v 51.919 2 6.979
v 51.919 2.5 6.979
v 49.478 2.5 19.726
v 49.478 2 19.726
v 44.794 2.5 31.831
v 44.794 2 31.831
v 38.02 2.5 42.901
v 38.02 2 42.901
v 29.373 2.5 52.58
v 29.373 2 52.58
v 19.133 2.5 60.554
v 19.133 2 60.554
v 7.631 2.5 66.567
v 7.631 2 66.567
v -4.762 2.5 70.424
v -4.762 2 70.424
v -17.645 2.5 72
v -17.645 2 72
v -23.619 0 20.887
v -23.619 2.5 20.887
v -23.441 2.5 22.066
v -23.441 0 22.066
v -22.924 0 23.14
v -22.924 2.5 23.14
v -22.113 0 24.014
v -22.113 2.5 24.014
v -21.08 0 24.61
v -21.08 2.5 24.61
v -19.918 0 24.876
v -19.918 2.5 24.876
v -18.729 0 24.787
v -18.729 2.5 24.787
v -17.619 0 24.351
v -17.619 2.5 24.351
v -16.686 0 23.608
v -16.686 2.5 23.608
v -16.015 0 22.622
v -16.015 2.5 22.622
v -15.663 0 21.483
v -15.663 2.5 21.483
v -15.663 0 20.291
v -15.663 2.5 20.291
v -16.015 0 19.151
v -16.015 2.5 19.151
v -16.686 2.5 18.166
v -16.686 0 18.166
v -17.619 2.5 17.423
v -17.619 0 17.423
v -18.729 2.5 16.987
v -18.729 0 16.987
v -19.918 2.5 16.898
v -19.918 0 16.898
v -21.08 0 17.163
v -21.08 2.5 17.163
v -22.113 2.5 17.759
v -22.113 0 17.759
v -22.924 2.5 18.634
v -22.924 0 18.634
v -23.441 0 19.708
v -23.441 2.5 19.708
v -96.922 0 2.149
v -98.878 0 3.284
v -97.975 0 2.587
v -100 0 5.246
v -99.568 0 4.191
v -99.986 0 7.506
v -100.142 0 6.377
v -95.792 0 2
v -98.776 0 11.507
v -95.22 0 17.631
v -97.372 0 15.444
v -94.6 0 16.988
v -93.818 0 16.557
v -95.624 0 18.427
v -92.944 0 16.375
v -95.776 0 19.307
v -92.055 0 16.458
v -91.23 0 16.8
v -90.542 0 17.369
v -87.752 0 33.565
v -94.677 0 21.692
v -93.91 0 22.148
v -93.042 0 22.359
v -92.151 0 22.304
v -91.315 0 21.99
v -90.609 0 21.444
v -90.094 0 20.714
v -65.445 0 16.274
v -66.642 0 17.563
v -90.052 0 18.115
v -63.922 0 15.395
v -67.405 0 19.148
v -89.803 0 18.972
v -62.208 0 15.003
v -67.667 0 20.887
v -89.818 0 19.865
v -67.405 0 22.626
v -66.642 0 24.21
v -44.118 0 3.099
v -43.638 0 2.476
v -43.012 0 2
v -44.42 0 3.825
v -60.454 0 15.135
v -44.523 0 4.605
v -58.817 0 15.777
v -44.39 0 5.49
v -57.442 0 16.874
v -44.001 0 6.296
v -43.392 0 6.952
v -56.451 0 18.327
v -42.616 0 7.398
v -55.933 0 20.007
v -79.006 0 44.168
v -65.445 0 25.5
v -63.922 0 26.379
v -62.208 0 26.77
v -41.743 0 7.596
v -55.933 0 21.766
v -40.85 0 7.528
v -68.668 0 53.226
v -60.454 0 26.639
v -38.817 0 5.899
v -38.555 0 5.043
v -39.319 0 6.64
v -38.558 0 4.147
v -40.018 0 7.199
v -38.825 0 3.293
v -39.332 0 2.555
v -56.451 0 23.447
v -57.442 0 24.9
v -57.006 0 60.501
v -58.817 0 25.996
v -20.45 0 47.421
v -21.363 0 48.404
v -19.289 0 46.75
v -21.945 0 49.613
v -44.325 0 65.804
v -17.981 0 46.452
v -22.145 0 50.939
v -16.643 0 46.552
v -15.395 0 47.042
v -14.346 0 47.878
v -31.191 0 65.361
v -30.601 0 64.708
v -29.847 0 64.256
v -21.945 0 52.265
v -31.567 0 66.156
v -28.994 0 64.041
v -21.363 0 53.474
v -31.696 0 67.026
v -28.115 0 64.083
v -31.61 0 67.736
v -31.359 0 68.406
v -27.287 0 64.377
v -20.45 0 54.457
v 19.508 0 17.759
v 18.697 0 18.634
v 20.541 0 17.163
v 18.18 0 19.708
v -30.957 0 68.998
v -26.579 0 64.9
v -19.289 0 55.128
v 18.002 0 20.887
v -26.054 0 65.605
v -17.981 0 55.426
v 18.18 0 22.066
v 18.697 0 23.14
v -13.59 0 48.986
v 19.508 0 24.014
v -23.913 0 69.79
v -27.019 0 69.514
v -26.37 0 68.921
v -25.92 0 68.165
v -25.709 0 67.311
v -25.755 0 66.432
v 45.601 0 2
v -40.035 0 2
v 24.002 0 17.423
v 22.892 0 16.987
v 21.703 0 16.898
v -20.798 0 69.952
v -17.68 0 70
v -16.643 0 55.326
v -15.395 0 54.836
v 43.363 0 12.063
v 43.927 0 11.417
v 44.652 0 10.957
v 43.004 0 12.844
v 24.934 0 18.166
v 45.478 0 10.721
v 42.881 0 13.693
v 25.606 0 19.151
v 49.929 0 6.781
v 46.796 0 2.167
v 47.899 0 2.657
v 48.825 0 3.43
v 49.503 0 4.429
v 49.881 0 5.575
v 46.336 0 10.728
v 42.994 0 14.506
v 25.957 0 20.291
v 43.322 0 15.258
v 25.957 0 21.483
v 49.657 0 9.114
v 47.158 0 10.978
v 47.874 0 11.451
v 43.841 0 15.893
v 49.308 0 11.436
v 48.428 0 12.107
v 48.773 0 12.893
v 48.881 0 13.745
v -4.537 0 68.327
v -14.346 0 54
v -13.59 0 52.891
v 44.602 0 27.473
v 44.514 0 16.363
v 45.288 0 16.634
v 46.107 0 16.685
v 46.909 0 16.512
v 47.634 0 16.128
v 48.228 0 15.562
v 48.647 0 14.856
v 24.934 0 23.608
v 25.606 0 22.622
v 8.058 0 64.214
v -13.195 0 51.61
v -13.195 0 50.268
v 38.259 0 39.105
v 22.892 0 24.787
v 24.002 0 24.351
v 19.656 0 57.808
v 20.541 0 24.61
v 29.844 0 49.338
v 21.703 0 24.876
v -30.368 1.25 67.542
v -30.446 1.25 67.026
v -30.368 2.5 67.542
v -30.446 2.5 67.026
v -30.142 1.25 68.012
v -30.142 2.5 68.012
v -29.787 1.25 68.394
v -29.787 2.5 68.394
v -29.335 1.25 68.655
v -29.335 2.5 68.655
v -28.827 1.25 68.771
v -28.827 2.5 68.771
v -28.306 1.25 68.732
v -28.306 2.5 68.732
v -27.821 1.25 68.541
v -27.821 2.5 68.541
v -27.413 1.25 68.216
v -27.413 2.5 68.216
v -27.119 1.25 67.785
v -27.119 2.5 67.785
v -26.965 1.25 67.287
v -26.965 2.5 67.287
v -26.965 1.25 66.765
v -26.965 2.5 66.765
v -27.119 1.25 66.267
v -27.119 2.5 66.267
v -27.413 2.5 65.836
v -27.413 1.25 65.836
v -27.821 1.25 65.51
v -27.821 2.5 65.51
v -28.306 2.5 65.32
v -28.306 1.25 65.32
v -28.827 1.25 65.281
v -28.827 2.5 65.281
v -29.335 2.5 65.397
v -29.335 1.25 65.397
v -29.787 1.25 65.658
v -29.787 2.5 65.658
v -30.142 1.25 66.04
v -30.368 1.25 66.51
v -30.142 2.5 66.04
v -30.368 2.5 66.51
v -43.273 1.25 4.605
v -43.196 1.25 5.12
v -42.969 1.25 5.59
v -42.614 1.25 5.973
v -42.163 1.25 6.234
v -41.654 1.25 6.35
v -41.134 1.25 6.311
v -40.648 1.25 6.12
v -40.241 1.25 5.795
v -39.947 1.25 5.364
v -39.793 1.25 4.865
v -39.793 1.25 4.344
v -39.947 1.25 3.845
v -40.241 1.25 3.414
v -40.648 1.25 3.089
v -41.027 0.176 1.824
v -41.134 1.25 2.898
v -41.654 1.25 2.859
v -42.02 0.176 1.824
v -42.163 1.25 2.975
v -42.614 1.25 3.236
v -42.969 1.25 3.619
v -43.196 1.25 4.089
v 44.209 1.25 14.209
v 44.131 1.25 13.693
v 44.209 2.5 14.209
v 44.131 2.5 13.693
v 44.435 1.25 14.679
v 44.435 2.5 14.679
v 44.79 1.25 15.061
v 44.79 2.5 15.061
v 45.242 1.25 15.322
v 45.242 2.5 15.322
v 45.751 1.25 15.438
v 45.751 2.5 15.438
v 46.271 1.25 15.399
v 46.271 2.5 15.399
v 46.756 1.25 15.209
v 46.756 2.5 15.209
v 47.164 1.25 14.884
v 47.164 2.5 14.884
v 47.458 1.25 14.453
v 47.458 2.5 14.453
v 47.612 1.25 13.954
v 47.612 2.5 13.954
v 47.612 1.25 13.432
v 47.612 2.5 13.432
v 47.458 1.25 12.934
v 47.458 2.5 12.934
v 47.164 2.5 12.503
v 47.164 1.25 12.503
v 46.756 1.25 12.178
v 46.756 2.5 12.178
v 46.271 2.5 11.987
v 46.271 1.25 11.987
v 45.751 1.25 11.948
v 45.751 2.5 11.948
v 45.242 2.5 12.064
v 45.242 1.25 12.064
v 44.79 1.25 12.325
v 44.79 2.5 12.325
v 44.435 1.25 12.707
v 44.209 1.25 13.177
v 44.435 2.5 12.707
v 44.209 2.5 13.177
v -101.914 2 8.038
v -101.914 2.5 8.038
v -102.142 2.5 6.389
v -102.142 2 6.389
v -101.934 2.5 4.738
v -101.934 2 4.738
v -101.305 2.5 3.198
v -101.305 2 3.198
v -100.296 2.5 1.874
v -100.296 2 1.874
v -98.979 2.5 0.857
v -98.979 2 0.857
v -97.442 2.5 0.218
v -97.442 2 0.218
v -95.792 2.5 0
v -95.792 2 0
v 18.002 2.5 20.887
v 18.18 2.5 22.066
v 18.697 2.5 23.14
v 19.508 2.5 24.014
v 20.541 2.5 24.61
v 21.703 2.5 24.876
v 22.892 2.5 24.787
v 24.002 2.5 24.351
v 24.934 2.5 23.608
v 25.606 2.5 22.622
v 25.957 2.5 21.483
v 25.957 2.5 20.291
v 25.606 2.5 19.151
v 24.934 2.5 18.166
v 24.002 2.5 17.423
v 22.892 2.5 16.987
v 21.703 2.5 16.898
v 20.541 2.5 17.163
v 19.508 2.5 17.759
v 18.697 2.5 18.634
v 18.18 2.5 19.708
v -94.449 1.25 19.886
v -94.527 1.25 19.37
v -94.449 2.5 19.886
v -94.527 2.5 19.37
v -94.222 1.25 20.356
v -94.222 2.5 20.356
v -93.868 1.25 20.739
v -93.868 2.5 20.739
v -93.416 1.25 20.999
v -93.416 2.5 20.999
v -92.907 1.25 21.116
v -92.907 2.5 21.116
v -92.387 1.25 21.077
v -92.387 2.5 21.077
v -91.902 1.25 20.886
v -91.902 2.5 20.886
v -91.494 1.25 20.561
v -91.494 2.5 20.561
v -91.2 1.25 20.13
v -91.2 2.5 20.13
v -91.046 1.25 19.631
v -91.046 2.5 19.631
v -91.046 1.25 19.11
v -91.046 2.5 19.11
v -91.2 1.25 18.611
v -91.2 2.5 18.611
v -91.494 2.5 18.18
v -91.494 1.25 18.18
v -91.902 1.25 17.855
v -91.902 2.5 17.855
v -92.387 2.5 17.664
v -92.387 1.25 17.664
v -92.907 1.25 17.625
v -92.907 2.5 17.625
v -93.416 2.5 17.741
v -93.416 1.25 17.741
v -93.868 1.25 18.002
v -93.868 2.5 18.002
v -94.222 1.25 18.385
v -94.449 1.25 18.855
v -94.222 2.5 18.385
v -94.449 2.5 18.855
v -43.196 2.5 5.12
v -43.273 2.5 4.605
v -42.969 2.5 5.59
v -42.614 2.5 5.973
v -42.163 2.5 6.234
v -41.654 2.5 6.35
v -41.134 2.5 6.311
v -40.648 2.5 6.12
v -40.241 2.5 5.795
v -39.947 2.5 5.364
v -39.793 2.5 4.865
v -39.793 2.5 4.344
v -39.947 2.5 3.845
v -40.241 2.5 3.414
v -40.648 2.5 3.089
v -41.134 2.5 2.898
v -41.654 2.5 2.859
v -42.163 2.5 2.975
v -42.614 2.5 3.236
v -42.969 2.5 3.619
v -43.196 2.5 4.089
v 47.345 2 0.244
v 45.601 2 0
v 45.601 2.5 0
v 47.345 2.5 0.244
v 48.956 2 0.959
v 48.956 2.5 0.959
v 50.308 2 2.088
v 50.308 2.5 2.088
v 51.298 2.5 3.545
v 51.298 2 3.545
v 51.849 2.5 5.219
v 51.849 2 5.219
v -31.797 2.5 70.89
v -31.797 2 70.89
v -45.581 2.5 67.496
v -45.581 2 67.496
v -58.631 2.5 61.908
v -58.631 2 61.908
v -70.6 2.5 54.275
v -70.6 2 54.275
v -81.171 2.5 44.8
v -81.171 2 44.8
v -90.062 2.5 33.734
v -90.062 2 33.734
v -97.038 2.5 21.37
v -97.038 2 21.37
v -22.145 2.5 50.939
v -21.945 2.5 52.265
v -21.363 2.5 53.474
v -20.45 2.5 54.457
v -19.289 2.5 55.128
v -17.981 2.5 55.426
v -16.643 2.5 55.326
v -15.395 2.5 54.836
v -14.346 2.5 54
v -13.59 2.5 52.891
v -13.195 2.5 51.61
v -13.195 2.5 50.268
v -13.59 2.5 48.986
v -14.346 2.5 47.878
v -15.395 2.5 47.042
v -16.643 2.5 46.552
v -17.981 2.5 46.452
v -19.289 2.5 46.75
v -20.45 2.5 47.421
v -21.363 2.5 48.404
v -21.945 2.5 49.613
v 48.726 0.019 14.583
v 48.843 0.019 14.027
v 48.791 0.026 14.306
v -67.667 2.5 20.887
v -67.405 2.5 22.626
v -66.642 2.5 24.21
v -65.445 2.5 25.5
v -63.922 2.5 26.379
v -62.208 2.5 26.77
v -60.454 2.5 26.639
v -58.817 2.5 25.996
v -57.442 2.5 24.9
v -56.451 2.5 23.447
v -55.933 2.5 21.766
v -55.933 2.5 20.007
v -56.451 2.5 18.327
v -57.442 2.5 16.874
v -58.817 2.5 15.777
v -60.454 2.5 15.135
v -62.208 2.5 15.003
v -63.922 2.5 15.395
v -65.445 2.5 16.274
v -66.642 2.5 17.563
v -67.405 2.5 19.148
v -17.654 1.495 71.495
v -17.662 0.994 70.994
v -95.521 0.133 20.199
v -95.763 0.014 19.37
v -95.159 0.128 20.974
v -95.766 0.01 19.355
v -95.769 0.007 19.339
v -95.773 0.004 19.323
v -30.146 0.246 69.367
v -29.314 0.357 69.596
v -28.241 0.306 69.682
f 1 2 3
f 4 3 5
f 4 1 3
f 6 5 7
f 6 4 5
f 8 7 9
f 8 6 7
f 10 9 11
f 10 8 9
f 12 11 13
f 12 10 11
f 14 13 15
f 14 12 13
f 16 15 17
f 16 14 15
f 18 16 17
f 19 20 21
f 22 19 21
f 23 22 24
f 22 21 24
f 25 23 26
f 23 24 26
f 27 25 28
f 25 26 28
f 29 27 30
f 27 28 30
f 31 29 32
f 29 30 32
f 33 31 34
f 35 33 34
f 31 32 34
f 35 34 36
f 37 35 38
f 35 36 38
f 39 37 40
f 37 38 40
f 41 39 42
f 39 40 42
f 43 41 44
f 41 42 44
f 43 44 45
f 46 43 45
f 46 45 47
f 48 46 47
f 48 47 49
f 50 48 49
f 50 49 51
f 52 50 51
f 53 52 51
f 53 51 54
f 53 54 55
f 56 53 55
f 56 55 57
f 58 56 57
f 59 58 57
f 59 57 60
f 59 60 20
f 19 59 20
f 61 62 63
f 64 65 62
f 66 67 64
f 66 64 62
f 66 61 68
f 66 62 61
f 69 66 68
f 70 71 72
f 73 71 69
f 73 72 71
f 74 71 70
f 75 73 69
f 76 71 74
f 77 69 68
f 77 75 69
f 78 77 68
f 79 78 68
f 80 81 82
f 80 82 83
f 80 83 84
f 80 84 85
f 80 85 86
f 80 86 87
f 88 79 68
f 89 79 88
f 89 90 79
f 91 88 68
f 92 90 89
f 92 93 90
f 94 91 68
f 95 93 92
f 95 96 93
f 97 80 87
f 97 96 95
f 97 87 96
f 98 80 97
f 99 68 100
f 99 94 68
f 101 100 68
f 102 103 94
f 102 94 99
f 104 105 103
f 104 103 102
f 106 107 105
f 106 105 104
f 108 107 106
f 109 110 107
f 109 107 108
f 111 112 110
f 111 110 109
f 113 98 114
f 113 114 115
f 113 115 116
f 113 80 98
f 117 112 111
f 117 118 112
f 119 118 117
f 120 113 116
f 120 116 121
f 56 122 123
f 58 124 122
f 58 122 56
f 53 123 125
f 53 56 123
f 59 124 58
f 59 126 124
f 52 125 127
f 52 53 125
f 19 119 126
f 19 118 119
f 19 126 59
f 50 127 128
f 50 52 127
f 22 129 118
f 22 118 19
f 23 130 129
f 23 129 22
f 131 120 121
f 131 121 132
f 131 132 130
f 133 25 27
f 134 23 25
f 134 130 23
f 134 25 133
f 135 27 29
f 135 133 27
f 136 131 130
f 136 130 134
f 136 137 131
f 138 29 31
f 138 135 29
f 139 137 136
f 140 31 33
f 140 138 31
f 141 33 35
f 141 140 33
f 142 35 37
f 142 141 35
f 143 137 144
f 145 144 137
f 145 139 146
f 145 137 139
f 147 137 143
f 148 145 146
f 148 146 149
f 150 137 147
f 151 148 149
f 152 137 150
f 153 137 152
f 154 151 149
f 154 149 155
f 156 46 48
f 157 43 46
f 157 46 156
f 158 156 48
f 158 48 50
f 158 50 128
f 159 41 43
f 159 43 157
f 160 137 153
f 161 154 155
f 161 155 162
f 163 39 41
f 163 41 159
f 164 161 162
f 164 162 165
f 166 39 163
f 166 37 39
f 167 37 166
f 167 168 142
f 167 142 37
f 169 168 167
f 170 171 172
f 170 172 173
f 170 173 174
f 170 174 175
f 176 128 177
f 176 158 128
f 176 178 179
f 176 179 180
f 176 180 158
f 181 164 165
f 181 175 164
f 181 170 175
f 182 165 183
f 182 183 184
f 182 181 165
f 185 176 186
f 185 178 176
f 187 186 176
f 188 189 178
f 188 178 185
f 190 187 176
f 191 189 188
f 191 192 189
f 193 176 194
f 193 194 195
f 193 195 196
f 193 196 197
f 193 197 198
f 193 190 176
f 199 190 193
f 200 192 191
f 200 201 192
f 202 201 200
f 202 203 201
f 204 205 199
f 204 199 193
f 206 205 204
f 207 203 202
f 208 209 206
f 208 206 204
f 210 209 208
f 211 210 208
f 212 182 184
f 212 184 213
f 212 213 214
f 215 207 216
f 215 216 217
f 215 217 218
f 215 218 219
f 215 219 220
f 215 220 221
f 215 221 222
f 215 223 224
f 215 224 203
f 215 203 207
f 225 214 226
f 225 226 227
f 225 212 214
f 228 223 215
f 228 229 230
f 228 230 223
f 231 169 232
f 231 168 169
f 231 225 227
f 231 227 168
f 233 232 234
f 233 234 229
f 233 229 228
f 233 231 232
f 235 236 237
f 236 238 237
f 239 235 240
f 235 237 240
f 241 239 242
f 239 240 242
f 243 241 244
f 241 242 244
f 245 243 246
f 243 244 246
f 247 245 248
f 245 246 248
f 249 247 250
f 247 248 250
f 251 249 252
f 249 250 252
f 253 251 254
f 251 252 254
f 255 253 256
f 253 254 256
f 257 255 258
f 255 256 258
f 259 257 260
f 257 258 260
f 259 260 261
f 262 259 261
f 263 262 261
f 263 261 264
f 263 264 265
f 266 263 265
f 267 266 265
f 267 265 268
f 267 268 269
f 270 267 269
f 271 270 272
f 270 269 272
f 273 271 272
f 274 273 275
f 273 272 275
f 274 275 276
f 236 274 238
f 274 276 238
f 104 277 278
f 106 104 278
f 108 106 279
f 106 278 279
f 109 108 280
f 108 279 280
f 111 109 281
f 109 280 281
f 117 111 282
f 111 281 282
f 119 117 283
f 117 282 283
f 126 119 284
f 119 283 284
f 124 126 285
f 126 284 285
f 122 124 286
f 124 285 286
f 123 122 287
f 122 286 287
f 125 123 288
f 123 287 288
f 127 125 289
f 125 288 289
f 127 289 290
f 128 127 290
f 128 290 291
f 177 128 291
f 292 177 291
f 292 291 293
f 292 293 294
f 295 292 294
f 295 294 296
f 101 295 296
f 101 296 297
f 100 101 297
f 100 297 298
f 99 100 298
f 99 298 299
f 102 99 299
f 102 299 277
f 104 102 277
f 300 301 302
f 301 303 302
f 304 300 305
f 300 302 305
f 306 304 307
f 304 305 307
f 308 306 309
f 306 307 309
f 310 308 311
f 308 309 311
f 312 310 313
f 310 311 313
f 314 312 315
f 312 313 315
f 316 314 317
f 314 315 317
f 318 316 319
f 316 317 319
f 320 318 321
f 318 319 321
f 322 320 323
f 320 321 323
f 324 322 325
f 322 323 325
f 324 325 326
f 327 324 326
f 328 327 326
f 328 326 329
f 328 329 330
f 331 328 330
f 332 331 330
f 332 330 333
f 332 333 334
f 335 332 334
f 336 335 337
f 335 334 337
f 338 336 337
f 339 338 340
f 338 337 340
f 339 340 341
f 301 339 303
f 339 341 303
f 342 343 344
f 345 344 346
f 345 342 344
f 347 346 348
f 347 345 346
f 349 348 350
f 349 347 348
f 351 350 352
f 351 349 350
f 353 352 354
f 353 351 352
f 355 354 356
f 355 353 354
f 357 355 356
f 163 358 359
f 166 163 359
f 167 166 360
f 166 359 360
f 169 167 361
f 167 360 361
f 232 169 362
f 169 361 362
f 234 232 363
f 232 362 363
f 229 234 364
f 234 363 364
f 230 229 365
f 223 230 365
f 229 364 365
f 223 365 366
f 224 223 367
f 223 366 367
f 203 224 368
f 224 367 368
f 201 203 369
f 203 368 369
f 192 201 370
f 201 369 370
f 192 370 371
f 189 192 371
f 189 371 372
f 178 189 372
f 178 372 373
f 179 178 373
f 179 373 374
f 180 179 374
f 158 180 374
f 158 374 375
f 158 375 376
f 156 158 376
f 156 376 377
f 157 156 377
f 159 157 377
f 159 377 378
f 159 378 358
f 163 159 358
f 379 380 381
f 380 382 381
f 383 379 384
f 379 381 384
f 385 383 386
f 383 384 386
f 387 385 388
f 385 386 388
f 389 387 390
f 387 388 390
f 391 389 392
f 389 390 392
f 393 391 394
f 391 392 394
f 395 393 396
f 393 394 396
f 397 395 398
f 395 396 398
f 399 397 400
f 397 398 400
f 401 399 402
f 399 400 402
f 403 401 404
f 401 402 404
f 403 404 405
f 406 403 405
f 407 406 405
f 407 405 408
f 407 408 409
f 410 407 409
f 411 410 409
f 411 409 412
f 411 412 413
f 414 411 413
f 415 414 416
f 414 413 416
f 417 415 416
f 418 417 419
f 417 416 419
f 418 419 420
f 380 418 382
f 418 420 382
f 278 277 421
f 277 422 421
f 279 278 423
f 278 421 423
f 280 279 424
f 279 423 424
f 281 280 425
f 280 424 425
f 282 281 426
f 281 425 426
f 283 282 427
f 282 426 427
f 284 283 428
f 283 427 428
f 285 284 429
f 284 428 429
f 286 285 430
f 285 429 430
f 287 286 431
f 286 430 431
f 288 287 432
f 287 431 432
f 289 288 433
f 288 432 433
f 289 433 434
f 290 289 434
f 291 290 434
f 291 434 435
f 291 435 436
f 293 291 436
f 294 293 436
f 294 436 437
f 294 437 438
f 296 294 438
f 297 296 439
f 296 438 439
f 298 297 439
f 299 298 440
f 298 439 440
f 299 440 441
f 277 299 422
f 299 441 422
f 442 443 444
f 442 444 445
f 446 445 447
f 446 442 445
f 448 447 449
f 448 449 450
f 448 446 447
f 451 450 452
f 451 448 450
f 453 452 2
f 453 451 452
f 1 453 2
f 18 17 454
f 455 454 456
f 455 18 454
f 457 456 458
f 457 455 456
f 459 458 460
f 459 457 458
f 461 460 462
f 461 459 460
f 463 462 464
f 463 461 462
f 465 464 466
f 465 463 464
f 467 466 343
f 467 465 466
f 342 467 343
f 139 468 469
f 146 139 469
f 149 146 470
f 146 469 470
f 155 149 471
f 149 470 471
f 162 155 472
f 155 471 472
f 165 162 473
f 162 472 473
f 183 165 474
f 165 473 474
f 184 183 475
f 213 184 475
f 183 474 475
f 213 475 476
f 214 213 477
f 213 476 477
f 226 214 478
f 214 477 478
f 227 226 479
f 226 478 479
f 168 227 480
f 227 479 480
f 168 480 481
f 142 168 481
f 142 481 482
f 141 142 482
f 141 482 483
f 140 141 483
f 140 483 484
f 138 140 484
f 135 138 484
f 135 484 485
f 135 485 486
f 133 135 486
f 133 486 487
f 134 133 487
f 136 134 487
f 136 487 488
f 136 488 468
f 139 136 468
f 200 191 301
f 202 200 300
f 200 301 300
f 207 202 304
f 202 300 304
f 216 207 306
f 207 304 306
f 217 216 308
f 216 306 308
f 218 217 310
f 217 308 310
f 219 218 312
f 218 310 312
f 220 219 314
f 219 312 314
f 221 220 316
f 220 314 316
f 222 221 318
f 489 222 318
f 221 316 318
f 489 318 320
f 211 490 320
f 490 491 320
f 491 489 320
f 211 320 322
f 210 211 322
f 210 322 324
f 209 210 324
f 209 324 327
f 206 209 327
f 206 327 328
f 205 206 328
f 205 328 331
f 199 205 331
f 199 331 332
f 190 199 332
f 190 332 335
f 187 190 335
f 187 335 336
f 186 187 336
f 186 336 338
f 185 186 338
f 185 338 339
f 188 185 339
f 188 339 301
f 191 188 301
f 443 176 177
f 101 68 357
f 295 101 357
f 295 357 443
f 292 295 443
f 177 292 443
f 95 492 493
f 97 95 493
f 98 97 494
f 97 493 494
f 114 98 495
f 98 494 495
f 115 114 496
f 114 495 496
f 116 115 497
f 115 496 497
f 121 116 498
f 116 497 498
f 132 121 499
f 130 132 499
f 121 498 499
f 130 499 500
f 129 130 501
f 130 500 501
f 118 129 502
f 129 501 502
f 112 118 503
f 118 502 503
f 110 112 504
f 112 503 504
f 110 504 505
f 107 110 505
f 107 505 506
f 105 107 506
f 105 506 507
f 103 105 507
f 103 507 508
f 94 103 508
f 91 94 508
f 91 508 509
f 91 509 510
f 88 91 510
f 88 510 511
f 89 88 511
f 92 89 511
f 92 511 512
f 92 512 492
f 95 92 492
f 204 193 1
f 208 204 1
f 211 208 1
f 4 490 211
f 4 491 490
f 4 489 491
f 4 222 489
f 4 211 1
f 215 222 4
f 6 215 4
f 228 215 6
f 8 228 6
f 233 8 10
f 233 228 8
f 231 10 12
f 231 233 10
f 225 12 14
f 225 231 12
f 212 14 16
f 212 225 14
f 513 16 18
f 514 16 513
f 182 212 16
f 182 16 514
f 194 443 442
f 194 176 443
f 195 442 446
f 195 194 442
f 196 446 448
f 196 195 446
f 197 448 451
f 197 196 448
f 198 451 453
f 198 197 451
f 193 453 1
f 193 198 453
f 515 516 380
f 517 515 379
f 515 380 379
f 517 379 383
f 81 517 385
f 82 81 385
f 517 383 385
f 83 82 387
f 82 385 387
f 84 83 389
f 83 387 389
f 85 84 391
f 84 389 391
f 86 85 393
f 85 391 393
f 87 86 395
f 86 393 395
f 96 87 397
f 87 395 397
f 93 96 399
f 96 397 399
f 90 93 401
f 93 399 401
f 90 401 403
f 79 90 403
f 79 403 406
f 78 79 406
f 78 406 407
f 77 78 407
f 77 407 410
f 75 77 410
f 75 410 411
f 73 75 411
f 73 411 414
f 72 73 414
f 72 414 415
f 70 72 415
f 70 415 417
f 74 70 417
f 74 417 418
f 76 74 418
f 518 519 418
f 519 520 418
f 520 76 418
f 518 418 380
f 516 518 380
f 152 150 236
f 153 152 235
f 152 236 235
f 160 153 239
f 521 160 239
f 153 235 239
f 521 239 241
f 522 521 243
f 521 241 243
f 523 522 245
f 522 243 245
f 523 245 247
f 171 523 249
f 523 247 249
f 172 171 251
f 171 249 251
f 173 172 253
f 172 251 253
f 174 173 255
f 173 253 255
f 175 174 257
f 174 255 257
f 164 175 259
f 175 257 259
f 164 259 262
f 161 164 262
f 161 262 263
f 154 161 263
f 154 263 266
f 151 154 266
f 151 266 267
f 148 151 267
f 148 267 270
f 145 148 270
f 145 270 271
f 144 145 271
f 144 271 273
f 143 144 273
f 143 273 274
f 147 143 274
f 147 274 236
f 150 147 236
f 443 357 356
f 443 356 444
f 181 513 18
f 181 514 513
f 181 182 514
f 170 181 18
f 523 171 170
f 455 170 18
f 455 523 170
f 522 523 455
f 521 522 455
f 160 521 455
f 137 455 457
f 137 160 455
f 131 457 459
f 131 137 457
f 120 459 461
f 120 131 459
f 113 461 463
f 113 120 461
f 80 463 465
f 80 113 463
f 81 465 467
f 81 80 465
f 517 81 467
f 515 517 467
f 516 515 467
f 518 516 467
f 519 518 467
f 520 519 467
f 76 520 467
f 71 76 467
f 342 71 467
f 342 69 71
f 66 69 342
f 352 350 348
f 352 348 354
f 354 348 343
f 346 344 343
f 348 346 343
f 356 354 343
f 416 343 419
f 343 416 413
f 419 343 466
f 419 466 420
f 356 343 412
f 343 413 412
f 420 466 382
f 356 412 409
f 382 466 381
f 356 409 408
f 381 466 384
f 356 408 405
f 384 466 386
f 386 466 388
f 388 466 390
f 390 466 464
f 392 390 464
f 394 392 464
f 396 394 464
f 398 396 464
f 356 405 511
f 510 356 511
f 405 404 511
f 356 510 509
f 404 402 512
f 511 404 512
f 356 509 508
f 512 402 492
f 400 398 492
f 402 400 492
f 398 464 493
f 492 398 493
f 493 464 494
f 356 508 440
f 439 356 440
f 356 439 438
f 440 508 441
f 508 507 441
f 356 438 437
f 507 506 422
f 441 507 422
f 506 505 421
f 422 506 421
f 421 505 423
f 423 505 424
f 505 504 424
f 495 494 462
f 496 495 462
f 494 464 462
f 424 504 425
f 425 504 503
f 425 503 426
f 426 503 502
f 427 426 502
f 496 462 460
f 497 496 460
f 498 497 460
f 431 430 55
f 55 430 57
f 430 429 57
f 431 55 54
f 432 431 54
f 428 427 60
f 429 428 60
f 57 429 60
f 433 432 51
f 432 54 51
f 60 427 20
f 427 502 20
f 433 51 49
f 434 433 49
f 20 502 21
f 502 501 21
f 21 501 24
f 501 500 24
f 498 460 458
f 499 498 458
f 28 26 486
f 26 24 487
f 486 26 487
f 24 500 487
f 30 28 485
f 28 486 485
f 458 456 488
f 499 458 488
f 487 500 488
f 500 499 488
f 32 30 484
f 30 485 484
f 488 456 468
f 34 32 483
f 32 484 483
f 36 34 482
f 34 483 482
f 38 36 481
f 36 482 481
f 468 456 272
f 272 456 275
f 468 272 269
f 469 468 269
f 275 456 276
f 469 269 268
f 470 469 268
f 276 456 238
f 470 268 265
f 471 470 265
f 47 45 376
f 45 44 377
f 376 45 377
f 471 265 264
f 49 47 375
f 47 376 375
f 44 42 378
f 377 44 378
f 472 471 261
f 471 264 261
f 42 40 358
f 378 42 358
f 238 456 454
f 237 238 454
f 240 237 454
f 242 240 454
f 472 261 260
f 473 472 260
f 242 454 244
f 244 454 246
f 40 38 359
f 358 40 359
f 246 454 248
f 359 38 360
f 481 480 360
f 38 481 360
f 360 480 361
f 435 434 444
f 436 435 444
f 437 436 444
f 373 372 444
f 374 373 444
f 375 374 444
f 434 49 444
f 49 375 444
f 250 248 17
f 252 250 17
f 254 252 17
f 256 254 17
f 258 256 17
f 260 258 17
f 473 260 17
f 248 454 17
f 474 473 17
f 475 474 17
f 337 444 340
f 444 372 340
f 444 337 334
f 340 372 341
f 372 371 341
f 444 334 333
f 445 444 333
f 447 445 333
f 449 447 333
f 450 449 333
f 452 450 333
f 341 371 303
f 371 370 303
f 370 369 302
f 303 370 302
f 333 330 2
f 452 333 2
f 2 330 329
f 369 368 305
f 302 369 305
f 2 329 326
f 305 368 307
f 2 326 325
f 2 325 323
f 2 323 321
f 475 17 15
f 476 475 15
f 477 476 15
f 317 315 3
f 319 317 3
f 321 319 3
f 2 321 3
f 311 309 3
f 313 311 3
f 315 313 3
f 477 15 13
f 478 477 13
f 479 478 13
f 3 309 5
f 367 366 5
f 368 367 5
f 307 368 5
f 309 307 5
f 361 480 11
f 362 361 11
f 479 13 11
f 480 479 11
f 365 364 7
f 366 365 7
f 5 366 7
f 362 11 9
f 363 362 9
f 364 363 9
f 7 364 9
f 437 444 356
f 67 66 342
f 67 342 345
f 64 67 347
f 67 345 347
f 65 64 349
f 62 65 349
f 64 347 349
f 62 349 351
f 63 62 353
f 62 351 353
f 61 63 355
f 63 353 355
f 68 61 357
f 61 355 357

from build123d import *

# Parameters (mm, degrees)
F1_DEPTH       = 2.5
F2_D           = 3.5
F2_CSINK_D     = 6
F2_CSINK_ANGLE = 90
F3_T1_DEPTH    = 141.3928063628
F3_T4_ANGLE    = 86.5781008802
F3_T6_ANGLE    = 95.6855323437
F3_T8_ANGLE    = 105.4133416791
F3_T10_ANGLE   = 78.1582231343
F4_D           = 11.8
F5_D           = 8
F6_D           = 9


# Not quite as in the source:
# - a fillet or chamfer that OpenCascade refuses, or shapes differently, is made with other operations: its cross-section is extruded or revolved along the edge and cut away or added


with BuildPart() as f1:
    # F0 (on Front) → F1 (new body)
    with BuildSketch(Plane.XZ):
        with BuildLine():
            ThreePointArc((51.9193532242, 6.9790848915), (29.3726830737, 52.5798387856), (-17.6447437911, 72))
            ThreePointArc((-17.6447437911, 72), (-70.6003478325, 54.2753932247), (-101.9138280482, 8.0377068475))
            ThreePointArc((-101.9138280482, 8.0377068475), (-100.843919646, 2.5025617927), (-95.7922150584, 0))
            Line((-95.7922150584, 0), (45.6005913044, 0))
            ThreePointArc((45.6005913044, 0), (50.3078829387, 2.0880866422), (51.9193532242, 6.9790848915))
        make_face()
    extrude(amount=-F1_DEPTH)

    # F2 (through all)
    with Locations(Plane.XZ):
        with Locations((-92.7765071392, 19.3704143167), (-28.6957714707, 67.0258700848), (45.8813235164, 13.6932386085), (-41.5233448148, 4.6045258641)):
            CounterSinkHole(F2_D / 2, F2_CSINK_D / 2, counter_sink_angle=F2_CSINK_ANGLE)

    # F3: chamfer of 2 on 1 edges, made by hand

    # F3_s2 → F3_t1 (cut)
    with BuildSketch(Plane.YZ.offset(-95.7922150584)):
        Polygon((0, 2), (2, 0), (0, 0), align=None)
    extrude(amount=F3_T1_DEPTH, mode=Mode.SUBTRACT)

    # F3_s3 → F3_t4 (revolve, cut)
    with BuildSketch(Plane(origin=(-0.1784402108, 0, 1.7923196444), x_dir=(0, 1, 0), z_dir=(0.0990684869, 0, -0.9950806173))):
        Polygon((2, 52.3553494356), (0, 50.3553494356), (0, 52.3553494356), align=None)
    revolve(axis=Axis((-19.9365535802, 0, -0.1747635854), (0, -1, 0)), revolution_arc=F3_T4_ANGLE, mode=Mode.SUBTRACT)

    # F3_s5 → F3_t6 (revolve, cut)
    with BuildSketch(Plane.YZ.offset(45.6005913044)):
        Polygon((2, 0), (0, 2), (0, 0), align=None)
    revolve(axis=Axis((45.6005913044, 0, 6.35), (0, -1, 0)), revolution_arc=F3_T6_ANGLE, mode=Mode.SUBTRACT)

    # F3_s7 → F3_t8 (revolve, cut)
    with BuildSketch(Plane(origin=(-5.1396919269, 0, -18.6425770032), x_dir=(0, 1, 0), z_dir=(0.2657806059, 0, 0.9640335417))):
        Polygon((0, 98.3846151976), (2, 100.3846151976), (0, 100.3846151976), align=None)
    revolve(axis=Axis((-95.7922150584, 0, 6.35), (0, -1, 0)), revolution_arc=F3_T8_ANGLE, mode=Mode.SUBTRACT)

    # F3_s9 → F3_t10 (revolve, cut)
    with BuildSketch(Plane(origin=(-16.9209977533, 0, 1.0561482837), x_dir=(0, 1, 0), z_dir=(0.9980577677, 0, -0.0622952035))):
        Polygon((2, 70.9128484948), (0, 68.9128484948), (0, 70.9128484948), align=None)
    revolve(axis=Axis((-17.9304192048, 0, -15.1162191548), (0, -1, 0)), revolution_arc=F3_T10_ANGLE, mode=Mode.SUBTRACT)

    # F4 (through all)
    with Locations(Plane.XZ):
        with Locations((-61.7667548358, 20.886823535)):
            Hole(F4_D / 2)

    # F5 (through all)
    with Locations(Plane.XZ):
        with Locations((-19.6185931563, 20.886823535), (22.0020785928, 20.886823535)):
            Hole(F5_D / 2)

    # F6 (through all)
    with Locations(Plane.XZ):
        with Locations((-17.6447437911, 50.9389452636)):
            Hole(F6_D / 2)


solid = f1.part
